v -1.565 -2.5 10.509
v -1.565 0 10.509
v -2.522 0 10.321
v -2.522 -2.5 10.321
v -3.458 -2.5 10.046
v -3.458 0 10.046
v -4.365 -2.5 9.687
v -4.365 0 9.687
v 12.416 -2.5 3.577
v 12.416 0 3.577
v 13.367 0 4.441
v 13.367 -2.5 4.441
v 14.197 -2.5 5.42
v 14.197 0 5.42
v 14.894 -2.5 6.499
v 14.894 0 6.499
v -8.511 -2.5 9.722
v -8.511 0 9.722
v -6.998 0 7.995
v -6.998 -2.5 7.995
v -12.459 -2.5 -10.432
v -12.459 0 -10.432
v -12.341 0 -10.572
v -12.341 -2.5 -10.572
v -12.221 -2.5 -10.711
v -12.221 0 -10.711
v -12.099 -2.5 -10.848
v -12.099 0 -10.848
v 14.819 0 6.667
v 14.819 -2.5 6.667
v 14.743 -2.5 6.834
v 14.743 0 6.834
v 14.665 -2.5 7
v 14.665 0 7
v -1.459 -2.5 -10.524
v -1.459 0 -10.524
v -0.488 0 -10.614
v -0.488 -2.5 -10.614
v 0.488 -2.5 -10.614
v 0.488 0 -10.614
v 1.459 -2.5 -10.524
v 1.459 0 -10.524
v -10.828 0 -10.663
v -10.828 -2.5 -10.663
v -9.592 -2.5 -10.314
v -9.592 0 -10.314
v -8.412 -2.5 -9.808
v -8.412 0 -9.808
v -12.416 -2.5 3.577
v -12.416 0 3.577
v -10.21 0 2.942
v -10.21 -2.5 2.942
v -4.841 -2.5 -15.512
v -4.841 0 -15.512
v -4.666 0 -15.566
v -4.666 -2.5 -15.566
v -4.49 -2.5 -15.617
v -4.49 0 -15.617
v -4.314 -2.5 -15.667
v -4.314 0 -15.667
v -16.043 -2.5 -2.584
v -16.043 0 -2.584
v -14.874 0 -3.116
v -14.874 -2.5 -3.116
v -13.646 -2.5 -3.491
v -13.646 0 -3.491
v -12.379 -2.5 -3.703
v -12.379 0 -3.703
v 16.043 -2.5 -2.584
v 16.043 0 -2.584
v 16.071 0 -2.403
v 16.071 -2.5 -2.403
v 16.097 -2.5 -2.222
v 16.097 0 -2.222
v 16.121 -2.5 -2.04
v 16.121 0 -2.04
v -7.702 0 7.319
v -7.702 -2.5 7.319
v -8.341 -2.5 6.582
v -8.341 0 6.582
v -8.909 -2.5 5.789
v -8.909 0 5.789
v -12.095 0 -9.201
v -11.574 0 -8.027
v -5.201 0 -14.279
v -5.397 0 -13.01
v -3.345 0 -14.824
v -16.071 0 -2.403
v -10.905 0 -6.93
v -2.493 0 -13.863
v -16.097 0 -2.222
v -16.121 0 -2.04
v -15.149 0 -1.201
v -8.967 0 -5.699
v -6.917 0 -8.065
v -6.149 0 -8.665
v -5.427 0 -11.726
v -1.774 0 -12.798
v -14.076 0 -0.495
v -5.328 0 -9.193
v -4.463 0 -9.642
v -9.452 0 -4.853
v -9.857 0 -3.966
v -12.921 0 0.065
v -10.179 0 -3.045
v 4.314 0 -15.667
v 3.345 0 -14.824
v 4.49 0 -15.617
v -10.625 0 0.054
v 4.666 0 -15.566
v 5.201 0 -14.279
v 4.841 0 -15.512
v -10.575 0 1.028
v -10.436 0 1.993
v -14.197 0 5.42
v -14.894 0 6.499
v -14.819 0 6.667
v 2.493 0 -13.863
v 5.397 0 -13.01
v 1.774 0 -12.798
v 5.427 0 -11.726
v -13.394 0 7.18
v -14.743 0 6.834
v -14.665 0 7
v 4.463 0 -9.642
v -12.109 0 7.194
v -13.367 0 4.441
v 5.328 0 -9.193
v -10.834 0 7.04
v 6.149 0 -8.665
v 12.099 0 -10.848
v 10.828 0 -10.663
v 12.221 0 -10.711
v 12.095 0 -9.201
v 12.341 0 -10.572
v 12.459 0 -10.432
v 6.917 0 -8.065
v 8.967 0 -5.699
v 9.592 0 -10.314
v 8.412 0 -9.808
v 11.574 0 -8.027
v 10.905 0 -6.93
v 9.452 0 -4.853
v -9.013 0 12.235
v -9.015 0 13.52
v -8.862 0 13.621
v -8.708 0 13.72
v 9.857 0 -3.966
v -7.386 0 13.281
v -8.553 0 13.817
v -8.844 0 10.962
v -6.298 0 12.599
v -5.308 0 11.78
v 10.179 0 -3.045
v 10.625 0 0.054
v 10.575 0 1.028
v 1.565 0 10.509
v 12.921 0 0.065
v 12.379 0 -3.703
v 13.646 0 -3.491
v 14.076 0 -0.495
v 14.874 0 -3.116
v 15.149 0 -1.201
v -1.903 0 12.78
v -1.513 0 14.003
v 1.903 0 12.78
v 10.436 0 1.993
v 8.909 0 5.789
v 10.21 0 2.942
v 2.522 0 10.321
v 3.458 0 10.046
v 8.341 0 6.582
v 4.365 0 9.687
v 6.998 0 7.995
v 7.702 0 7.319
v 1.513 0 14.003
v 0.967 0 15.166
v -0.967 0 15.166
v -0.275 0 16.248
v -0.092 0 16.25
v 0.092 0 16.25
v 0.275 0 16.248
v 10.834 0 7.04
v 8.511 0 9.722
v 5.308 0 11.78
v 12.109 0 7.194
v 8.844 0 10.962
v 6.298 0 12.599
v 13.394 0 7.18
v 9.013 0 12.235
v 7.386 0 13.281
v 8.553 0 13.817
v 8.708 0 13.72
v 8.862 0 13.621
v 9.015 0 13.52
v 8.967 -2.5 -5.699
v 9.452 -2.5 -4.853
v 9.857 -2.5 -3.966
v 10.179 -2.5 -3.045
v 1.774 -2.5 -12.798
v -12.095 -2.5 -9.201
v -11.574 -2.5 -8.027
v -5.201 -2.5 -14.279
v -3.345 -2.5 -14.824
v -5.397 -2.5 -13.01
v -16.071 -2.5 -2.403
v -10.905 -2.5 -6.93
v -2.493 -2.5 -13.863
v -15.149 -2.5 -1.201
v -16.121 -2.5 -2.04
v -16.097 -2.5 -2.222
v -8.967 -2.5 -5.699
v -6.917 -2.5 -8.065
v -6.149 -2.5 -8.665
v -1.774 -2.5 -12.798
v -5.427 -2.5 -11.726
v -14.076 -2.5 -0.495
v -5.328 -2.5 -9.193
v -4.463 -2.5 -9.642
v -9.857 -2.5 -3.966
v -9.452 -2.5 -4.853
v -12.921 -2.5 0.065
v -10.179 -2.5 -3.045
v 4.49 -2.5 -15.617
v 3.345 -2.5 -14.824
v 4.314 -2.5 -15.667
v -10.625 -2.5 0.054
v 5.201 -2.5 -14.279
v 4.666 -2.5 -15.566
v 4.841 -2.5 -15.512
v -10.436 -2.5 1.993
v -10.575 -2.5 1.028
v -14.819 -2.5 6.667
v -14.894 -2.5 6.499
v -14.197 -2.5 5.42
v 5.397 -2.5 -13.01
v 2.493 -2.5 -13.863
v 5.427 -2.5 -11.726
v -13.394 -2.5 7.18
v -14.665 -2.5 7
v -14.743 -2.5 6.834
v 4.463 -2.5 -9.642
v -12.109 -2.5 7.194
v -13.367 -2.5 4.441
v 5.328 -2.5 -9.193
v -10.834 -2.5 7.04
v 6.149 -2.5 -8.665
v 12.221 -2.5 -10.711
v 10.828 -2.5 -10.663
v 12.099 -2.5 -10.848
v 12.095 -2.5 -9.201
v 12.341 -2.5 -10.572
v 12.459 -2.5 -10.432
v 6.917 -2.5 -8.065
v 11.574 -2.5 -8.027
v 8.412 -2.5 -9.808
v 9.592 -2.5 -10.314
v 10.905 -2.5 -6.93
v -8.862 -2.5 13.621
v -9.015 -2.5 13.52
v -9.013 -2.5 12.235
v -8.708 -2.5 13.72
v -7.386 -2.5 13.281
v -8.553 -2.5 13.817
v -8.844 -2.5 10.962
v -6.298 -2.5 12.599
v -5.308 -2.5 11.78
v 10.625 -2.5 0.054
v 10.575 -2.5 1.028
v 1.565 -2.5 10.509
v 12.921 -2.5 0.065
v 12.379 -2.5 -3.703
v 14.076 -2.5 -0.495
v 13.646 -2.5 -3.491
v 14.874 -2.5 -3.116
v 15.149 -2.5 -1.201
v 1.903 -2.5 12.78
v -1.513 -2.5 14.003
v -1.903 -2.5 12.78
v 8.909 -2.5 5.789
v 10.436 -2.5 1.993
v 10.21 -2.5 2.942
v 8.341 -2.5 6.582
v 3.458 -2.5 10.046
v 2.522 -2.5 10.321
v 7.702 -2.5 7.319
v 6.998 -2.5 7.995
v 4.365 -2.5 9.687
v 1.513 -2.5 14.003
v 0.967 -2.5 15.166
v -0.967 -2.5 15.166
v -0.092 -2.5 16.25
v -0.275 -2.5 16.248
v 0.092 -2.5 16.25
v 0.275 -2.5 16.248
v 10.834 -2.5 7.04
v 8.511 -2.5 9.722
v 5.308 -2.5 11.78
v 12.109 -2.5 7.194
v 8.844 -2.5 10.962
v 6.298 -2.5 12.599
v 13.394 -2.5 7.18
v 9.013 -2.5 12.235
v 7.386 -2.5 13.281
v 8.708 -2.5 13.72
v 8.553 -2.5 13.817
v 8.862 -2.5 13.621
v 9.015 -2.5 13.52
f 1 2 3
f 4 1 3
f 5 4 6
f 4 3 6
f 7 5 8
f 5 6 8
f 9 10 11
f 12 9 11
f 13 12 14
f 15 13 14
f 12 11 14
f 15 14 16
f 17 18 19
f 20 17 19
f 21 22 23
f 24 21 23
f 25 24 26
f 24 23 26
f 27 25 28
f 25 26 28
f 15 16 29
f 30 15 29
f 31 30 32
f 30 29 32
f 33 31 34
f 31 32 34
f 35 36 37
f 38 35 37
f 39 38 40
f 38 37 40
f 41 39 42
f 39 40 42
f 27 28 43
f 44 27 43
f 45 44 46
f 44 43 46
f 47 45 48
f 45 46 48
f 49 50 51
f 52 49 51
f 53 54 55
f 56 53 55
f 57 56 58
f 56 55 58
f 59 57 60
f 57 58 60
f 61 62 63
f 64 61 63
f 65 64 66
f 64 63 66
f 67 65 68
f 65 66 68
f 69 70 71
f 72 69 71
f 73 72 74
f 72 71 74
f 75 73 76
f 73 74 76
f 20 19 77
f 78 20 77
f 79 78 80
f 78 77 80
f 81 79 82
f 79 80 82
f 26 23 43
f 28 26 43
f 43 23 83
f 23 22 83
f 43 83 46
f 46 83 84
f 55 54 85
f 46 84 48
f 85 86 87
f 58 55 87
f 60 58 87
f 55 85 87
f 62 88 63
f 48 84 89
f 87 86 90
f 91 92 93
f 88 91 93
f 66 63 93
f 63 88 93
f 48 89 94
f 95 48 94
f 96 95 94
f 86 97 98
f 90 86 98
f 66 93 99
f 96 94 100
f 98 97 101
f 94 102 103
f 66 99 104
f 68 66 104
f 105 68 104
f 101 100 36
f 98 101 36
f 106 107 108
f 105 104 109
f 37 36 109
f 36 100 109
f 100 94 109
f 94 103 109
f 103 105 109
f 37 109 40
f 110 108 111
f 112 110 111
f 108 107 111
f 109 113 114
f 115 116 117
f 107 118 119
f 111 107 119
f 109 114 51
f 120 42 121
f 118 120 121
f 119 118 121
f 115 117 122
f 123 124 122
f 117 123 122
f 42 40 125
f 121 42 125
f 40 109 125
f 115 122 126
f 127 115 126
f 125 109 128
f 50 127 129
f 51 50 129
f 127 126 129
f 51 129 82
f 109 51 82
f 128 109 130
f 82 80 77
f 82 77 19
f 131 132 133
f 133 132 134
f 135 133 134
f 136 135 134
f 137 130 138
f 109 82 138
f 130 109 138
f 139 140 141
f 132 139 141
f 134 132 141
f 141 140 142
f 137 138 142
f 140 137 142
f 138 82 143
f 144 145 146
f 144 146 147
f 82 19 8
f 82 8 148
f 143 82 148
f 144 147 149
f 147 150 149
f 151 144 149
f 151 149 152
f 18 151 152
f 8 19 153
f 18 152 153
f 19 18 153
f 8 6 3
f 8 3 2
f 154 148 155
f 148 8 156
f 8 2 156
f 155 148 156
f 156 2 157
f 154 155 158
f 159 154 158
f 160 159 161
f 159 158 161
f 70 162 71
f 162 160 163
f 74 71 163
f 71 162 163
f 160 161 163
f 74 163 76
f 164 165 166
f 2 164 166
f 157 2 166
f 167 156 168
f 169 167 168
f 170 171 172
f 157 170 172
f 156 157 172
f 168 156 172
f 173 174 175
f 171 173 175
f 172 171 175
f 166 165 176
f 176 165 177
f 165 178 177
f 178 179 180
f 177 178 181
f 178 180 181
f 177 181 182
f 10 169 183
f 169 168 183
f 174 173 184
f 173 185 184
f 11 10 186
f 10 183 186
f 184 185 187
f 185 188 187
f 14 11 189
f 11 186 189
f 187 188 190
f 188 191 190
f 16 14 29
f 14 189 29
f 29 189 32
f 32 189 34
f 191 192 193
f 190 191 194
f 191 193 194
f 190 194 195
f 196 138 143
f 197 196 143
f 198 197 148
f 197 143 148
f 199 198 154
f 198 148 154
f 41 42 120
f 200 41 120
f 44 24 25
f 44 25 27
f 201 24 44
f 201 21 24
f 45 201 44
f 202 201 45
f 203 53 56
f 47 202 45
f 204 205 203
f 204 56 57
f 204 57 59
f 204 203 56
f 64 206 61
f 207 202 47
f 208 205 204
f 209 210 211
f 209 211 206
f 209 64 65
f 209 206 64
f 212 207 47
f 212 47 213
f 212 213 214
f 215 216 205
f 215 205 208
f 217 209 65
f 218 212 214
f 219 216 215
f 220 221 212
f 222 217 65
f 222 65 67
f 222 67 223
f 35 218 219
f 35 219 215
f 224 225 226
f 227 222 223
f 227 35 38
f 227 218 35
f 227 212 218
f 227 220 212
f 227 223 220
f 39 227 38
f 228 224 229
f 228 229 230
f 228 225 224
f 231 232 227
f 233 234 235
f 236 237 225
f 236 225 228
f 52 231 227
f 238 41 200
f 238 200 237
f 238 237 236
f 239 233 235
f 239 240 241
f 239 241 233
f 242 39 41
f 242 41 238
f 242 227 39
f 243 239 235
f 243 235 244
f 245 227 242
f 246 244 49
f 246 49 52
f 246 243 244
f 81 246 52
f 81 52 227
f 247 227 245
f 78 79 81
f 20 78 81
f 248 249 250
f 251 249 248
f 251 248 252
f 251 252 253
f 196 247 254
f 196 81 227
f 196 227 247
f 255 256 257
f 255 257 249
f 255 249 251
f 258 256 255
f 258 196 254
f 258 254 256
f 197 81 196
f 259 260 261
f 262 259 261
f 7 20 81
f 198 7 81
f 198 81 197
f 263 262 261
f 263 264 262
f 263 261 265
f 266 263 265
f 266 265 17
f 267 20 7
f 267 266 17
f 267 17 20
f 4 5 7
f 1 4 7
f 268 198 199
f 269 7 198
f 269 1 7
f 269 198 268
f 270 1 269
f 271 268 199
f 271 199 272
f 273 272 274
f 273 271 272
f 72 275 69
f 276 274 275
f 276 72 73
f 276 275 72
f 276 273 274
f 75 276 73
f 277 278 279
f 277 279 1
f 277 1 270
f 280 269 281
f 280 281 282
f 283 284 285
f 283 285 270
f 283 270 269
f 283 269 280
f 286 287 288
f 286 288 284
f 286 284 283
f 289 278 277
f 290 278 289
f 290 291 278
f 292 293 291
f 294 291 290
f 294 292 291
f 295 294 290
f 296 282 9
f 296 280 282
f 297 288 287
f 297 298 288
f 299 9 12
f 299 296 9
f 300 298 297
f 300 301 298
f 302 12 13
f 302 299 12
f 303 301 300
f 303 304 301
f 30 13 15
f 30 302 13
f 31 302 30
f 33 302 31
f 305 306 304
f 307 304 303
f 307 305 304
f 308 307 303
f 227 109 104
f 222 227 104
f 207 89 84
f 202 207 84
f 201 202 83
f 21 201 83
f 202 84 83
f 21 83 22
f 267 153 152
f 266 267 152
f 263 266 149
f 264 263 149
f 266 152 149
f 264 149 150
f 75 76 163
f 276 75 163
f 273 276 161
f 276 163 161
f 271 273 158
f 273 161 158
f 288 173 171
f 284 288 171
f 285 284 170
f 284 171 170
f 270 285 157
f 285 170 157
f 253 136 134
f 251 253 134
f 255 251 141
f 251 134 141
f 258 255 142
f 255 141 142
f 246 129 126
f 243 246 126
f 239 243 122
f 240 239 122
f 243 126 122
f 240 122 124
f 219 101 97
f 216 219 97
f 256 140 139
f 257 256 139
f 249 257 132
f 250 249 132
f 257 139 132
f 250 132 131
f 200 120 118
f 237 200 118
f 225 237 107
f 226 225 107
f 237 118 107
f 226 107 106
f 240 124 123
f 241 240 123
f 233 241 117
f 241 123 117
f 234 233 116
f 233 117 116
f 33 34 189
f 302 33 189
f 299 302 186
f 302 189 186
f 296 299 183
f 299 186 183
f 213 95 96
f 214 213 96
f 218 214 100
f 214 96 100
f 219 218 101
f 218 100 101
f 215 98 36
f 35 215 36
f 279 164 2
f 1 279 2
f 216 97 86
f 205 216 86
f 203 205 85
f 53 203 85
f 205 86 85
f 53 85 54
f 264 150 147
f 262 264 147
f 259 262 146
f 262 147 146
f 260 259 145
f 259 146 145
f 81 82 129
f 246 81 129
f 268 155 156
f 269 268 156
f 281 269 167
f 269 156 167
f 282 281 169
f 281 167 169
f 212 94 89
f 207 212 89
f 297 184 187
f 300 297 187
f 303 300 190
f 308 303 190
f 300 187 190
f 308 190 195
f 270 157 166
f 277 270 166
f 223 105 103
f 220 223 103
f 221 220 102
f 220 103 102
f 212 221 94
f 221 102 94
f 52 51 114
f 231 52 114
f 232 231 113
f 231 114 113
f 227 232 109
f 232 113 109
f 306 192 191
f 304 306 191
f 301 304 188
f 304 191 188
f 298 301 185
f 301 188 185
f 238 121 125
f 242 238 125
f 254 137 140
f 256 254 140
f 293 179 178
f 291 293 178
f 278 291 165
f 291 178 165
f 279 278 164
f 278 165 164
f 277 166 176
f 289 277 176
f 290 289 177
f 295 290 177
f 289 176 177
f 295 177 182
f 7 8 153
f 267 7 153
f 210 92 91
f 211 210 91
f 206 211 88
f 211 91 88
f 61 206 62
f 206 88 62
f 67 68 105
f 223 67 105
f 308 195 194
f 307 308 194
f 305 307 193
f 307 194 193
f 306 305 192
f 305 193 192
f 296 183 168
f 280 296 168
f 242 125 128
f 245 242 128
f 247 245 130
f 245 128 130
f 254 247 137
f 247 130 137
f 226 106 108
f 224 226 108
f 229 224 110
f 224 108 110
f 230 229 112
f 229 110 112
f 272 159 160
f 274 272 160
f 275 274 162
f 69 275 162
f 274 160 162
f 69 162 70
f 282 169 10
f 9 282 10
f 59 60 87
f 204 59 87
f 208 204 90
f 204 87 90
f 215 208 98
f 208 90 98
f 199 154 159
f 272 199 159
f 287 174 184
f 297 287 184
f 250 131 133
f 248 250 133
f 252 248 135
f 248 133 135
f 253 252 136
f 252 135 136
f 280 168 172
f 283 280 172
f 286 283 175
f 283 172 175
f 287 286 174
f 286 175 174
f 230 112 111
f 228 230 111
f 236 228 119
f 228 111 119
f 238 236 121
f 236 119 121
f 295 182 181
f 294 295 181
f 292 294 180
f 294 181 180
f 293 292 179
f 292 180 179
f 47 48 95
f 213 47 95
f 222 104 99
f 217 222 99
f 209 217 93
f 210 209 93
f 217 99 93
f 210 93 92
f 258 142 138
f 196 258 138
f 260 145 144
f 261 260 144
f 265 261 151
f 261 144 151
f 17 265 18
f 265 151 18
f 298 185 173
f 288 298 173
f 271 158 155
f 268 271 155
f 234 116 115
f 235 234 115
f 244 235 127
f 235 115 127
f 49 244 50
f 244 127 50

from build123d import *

# Parameters (mm, degrees)
F2_DEPTH        = 2.5
F2_COPIES_COUNT = 11
F3_DEPTH        = 2.5


# Not quite as in the source:
# - a pattern or mirror of a feature is missing from the dataset's text; its kind, count and spacing are read off the source's solid


with BuildPart() as f2:
    # F1 (on Front) → F2 (new body)
    with BuildSketch(Plane.XZ):
        with BuildLine():
            ThreePointArc((1.9034310201, 12.7798019983), (1.2593174989, 14.5936400637), (0.2749085502, 16.2476744579))
            ThreePointArc((0.2749085502, 16.2476744579), (0, 16.25), (-0.2749085502, 16.2476744579))
            ThreePointArc((-0.2749085502, 16.2476744579), (-1.2593174989, 14.5936400637), (-1.9034310201, 12.7798019983))
            Line((-1.9034310201, 12.7798019983), (-1.5652278506, 10.5090763998))
            ThreePointArc((-1.5652278506, 10.5090763998), (0, 10.625), (1.5652278506, 10.5090763998))
            Line((1.5652278506, 10.5090763998), (1.9034310201, 12.7798019983))
        make_face()
    extrude(amount=F2_DEPTH)


with BuildPart() as f2_copies_1:
    # F2_copies: instance of F2
    add(f2.part.rotate(Axis((0, 0, 0), (0, 1, 0)), 1 * 360 / F2_COPIES_COUNT))


with BuildPart() as f2_copies_2:
    # F2_copies: instance of F2
    add(f2.part.rotate(Axis((0, 0, 0), (0, 1, 0)), 2 * 360 / F2_COPIES_COUNT))


with BuildPart() as f2_copies_3:
    # F2_copies: instance of F2
    add(f2.part.rotate(Axis((0, 0, 0), (0, 1, 0)), 3 * 360 / F2_COPIES_COUNT))


with BuildPart() as f2_copies_4:
    # F2_copies: instance of F2
    add(f2.part.rotate(Axis((0, 0, 0), (0, 1, 0)), 4 * 360 / F2_COPIES_COUNT))


with BuildPart() as f2_copies_5:
    # F2_copies: instance of F2
    add(f2.part.rotate(Axis((0, 0, 0), (0, 1, 0)), 5 * 360 / F2_COPIES_COUNT))


with BuildPart() as f2_copies_6:
    # F2_copies: instance of F2
    add(f2.part.rotate(Axis((0, 0, 0), (0, 1, 0)), 6 * 360 / F2_COPIES_COUNT))


with BuildPart() as f2_copies_7:
    # F2_copies: instance of F2
    add(f2.part.rotate(Axis((0, 0, 0), (0, 1, 0)), 7 * 360 / F2_COPIES_COUNT))


with BuildPart() as f2_copies_8:
    # F2_copies: instance of F2
    add(f2.part.rotate(Axis((0, 0, 0), (0, 1, 0)), 8 * 360 / F2_COPIES_COUNT))


with BuildPart() as f2_copies_9:
    # F2_copies: instance of F2
    add(f2.part.rotate(Axis((0, 0, 0), (0, 1, 0)), 9 * 360 / F2_COPIES_COUNT))


with BuildPart() as f2_copies_10:
    # F2_copies: instance of F2
    add(f2.part.rotate(Axis((0, 0, 0), (0, 1, 0)), 10 * 360 / F2_COPIES_COUNT))


with BuildPart() as f2_1:
    add(f2.part)

    add(f2_copies_1.part)  # F3 merges F2_copies_1

    add(f2_copies_2.part)  # F3 merges F2_copies_2

    add(f2_copies_3.part)  # F3 merges F2_copies_3

    add(f2_copies_4.part)  # F3 merges F2_copies_4

    add(f2_copies_5.part)  # F3 merges F2_copies_5

    add(f2_copies_6.part)  # F3 merges F2_copies_6

    add(f2_copies_7.part)  # F3 merges F2_copies_7

    add(f2_copies_8.part)  # F3 merges F2_copies_8

    add(f2_copies_9.part)  # F3 merges F2_copies_9

    add(f2_copies_10.part)  # F3 merges F2_copies_10
    # F1 (on Front) → F3 (join)
    with BuildSketch(Plane.XZ):
        with BuildLine():
            ThreePointArc((10.625, 0), (8.0473961911, 6.9375816784), (1.5652278506, 10.5090763998))
            ThreePointArc((1.5652278506, 10.5090763998), (0, 10.625), (-1.5652278506, 10.5090763998))
            ThreePointArc((-1.5652278506, 10.5090763998), (-6.9375816784, -8.0473961911), (10.625, 0))
        make_face()
    extrude(amount=F3_DEPTH)


solid = f2_1.part
